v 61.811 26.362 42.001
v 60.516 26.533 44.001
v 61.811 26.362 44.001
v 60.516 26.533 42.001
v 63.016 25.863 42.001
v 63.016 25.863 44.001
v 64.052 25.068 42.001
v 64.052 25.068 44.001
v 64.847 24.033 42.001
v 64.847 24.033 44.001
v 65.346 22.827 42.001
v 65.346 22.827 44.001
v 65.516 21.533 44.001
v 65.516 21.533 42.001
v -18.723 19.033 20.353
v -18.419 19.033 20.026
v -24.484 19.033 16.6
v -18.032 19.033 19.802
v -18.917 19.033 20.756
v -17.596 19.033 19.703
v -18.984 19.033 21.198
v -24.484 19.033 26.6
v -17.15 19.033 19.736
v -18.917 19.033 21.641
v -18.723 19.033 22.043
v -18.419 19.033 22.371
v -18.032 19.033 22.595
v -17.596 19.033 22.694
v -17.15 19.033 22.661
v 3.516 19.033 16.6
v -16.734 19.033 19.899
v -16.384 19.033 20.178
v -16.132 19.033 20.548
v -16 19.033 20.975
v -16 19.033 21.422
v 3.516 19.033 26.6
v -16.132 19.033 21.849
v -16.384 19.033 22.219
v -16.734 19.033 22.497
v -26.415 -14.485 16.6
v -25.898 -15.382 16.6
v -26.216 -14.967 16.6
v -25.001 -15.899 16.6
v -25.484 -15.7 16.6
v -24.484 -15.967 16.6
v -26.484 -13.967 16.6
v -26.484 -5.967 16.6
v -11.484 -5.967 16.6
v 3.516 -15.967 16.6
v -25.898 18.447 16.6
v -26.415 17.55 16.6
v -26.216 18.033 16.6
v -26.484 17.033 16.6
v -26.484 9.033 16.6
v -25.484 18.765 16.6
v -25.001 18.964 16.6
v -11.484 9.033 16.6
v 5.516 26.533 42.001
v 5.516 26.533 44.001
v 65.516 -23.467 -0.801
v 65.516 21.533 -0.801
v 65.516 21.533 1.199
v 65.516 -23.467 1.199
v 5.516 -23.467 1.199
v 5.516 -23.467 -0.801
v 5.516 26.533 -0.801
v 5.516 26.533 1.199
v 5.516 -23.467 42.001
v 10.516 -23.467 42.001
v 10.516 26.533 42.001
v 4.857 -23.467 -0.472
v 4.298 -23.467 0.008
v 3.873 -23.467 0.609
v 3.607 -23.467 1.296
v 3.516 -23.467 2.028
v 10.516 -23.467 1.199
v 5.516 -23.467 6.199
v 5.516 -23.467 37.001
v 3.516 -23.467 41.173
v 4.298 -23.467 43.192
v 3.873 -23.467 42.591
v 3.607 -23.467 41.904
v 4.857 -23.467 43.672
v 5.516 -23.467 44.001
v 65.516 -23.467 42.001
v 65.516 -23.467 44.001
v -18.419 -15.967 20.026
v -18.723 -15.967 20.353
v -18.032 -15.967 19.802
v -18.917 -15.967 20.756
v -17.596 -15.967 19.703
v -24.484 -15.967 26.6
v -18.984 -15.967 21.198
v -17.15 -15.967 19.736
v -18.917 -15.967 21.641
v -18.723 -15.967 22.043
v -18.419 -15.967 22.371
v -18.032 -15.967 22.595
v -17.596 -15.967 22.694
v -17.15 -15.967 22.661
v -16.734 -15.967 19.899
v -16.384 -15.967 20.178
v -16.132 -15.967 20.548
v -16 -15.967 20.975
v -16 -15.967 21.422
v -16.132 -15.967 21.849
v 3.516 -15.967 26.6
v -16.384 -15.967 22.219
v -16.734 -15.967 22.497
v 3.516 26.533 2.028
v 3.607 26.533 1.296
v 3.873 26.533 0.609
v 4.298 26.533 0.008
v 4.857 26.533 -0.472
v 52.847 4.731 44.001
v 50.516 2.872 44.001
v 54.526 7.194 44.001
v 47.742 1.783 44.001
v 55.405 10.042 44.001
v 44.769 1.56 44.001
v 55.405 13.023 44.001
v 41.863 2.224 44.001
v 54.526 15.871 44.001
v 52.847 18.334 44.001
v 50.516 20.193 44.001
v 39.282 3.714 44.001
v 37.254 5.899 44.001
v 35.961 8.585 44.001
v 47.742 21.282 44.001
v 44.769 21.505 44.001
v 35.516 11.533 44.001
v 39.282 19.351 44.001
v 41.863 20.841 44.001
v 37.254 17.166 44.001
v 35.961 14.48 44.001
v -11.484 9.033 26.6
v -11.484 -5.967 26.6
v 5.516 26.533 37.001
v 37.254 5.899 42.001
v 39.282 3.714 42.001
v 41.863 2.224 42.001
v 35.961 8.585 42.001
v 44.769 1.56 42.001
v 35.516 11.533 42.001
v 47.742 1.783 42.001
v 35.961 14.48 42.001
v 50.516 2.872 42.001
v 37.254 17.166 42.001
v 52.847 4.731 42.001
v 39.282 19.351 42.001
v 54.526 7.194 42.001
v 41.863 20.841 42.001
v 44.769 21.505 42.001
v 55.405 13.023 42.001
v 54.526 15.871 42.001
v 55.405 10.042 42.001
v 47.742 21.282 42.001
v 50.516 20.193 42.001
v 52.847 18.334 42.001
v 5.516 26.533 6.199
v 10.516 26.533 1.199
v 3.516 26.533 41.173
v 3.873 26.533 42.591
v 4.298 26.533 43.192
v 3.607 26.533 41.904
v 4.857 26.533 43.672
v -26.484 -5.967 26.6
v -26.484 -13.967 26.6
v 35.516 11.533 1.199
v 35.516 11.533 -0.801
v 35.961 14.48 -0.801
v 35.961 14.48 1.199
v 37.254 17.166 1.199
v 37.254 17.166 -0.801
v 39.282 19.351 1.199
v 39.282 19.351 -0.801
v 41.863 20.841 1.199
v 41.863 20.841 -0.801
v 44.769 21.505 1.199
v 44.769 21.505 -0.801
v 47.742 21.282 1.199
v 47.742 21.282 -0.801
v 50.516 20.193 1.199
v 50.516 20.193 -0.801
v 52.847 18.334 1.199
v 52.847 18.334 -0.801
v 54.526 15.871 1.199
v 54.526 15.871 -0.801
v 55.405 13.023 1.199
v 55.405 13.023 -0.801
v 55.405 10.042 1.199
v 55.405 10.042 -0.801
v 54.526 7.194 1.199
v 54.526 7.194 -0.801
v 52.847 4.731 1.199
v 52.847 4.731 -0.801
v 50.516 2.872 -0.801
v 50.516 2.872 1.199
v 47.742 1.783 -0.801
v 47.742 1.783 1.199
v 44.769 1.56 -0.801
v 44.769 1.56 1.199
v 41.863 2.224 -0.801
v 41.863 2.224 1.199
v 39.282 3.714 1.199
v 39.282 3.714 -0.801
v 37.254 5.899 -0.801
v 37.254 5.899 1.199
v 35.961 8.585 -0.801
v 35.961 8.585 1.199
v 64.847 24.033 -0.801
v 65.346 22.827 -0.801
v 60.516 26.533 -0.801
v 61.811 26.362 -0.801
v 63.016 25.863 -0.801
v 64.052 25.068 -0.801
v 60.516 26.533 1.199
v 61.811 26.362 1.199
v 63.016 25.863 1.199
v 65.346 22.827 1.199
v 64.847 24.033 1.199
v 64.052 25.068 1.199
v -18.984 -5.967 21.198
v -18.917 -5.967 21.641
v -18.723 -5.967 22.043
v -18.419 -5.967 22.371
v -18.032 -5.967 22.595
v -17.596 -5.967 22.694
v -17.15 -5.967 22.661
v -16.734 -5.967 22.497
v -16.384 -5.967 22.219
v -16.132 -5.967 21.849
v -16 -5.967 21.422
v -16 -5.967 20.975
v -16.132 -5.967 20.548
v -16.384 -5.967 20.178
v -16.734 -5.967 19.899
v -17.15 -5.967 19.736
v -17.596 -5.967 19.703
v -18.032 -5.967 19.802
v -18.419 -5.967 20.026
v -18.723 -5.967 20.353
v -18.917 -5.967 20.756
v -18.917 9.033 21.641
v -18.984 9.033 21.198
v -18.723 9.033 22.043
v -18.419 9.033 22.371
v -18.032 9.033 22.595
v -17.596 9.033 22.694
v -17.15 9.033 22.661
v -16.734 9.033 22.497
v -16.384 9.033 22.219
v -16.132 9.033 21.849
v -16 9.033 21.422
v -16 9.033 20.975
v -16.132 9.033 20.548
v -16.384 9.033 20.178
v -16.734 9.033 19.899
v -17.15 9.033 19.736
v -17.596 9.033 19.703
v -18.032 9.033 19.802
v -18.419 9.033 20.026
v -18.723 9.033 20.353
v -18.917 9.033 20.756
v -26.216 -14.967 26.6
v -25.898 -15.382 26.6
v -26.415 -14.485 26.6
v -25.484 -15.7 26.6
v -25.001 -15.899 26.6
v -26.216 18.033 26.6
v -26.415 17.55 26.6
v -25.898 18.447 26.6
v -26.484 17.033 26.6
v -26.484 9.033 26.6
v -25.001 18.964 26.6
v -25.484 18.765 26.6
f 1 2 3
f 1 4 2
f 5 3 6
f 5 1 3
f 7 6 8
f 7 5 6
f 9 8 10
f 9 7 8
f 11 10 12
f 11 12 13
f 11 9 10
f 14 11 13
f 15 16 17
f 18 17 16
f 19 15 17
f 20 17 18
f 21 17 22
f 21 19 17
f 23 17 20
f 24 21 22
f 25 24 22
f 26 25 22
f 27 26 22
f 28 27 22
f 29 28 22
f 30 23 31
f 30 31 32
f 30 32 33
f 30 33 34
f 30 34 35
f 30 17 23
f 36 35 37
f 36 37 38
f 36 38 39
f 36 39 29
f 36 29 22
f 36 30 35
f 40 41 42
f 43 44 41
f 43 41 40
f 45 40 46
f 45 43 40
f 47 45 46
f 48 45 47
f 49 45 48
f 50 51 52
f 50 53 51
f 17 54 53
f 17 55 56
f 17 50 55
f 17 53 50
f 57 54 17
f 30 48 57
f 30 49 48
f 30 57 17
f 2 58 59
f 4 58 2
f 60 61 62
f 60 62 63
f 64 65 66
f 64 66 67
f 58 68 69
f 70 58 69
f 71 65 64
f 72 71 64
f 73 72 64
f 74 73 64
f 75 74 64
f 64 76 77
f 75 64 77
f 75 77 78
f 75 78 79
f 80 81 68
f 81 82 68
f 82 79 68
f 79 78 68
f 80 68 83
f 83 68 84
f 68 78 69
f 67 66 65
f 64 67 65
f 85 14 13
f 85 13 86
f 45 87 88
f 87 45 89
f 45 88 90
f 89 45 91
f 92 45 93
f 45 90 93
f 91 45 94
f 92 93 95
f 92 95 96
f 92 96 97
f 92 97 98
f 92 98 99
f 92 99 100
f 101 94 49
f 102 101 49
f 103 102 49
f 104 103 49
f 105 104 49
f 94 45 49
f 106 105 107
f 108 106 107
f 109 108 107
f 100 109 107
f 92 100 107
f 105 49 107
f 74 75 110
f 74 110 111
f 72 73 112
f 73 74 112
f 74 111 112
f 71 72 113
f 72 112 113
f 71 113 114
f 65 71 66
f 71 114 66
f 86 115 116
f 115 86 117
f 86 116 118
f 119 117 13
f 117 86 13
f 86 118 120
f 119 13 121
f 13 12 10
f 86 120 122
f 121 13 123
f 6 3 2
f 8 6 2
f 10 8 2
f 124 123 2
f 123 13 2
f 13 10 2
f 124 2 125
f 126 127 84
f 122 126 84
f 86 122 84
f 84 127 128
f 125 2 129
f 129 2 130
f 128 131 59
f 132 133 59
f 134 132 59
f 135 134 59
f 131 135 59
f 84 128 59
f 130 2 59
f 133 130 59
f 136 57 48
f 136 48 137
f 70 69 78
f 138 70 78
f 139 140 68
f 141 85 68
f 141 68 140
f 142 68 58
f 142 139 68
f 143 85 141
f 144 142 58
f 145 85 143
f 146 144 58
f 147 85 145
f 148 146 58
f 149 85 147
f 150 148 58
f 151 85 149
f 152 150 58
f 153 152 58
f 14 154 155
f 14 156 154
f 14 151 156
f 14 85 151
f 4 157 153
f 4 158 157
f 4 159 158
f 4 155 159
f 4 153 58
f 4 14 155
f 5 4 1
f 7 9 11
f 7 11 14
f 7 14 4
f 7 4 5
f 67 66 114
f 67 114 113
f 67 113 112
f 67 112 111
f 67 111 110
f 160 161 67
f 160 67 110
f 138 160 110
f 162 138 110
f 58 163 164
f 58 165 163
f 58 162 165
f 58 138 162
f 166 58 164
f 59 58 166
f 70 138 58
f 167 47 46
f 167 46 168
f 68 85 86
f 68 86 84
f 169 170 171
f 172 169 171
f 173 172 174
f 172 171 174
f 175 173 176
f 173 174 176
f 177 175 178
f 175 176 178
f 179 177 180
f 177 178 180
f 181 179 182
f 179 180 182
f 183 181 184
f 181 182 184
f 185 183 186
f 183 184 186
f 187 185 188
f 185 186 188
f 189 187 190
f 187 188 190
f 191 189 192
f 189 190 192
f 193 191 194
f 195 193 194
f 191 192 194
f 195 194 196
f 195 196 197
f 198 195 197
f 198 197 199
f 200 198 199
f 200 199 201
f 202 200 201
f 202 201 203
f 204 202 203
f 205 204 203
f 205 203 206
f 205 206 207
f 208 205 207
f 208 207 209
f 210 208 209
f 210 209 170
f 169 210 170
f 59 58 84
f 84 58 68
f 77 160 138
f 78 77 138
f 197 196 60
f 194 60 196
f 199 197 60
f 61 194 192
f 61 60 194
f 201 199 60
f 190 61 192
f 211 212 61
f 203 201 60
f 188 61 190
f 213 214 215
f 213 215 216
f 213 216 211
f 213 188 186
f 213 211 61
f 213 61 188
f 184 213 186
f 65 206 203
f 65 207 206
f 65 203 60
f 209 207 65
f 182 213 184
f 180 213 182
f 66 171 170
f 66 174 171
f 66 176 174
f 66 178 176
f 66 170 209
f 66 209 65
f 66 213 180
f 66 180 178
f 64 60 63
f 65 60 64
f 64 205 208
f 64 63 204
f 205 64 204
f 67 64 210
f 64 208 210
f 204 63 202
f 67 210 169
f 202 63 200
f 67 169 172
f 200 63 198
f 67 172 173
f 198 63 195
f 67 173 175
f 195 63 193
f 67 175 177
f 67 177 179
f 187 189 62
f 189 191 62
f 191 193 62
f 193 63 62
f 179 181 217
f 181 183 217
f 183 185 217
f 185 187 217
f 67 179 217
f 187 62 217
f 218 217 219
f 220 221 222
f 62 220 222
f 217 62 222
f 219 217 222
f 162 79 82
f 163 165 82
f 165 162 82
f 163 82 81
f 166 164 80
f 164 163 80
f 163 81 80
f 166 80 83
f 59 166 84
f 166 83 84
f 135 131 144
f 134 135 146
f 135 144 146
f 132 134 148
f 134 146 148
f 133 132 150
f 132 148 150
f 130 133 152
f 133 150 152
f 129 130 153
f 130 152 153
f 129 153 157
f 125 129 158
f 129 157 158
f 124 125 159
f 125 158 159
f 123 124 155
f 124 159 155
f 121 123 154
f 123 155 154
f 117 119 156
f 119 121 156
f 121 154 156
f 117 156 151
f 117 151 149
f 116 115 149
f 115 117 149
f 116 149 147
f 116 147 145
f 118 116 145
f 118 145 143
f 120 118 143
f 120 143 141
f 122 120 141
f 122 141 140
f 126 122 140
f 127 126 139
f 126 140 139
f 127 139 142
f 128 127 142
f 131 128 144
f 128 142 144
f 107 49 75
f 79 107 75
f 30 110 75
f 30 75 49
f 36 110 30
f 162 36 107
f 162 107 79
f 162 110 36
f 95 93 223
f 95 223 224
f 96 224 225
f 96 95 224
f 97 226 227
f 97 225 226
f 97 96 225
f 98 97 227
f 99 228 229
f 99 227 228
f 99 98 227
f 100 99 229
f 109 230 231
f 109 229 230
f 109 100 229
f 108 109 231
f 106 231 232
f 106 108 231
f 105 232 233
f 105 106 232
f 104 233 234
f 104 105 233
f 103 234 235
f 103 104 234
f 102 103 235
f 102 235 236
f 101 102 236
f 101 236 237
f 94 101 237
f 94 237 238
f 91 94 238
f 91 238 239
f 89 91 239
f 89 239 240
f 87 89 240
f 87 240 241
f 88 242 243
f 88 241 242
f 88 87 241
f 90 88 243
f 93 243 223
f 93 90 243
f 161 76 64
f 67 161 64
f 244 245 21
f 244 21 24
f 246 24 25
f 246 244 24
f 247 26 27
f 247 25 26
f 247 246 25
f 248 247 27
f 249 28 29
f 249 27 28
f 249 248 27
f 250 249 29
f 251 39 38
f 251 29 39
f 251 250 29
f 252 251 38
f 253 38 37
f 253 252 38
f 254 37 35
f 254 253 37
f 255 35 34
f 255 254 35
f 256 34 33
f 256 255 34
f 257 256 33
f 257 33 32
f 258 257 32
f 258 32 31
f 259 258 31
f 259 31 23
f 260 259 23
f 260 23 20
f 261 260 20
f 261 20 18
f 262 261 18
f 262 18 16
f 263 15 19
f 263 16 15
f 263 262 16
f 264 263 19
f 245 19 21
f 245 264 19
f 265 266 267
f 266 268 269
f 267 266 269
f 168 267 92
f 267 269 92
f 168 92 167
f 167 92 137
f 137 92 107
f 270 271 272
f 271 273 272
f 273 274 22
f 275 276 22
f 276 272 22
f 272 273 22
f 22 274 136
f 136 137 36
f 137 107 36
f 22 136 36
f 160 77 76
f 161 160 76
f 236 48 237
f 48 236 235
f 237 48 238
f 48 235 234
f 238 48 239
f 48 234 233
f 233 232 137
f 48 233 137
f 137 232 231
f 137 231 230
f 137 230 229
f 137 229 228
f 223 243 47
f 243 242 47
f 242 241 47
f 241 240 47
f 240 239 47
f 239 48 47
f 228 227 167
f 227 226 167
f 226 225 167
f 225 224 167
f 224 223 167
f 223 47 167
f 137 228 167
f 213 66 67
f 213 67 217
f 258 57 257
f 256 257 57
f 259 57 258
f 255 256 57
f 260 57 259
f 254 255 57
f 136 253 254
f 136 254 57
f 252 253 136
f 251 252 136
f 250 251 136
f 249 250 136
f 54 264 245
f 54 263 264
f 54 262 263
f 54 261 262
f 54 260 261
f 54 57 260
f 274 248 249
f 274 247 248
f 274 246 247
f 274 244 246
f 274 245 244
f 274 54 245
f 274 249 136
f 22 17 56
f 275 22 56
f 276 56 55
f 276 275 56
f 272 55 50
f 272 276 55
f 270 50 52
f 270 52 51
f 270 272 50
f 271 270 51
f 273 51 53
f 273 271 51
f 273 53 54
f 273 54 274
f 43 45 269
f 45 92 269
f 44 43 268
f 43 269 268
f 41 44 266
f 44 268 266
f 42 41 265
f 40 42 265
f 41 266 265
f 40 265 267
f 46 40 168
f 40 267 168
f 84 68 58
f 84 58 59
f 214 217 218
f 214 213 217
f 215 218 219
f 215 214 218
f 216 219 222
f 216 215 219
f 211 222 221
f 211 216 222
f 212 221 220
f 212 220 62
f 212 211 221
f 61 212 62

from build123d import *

# Parameters (mm, degrees)
SKETCH_3_R               = 3
EXTRUDE_6_DEPTH          = 0.001
EXTRUDE_6_2_DEPTH        = 0.001
EXTRUDE_6_3_DEPTH        = 0.001
EXTRUDE_6_4_DEPTH        = 0.001
CUT_EXTRUDE_2_DEPTH      = 67.213034483
CUT_EXTRUDE_2_DEPTH_BACK = 67.213034483
SKETCH_11_R              = 2.25
EXTRUDE_7_DEPTH          = 2
EXTRUDE_7_DEPTH_BACK     = 0.801922547
SKETCH_14_R              = 10
CUT_EXTRUDE_3_DEPTH      = 3
SKETCH_12_4_R            = 10
EXTRUDE_10_DEPTH         = 44
SKETCH_20_W              = 40.801922547
SKETCH_20_H              = 50
CUT_EXTRUDE_6_DEPTH      = 60
SKETCH_21_W              = 44.801922547
SKETCH_21_H              = 50
EXTRUDE_11_DEPTH         = 2
FILLET_2_R               = 5
FILLET_3_R               = 5
FILLET_5_R               = 3
FILLET_6_R               = 3
EXTRUDE_15_DEPTH         = 50
SKETCH_36_W              = 10
SKETCH_36_H              = 35
EXTRUDE_16_DEPTH         = 30
FILLET_7_R               = 2
CUT_EXTRUDE_8_DEPTH      = 90.636750061
CUT_EXTRUDE_8_DEPTH_BACK = 90.636750061
SKETCH_39_R              = 1.5
SKETCH_38_W              = 10
SKETCH_38_H              = 15
CUT_EXTRUDE_9_DEPTH      = 15


with BuildPart() as part:
    # 草图3 → 凸台-拉伸6 (new body)
    with BuildSketch(Plane.XY):
        with Locations((60.266478541, 16.532501821)):
            Circle(SKETCH_3_R)
    extrude(amount=EXTRUDE_6_DEPTH)


with BuildPart() as body_2:
    # 草图3 → Extrude 6 2 (new body)
    with BuildSketch(Plane.XY):
        with Locations((60.266478541, 6.532501821)):
            Circle(SKETCH_3_R)
    extrude(amount=EXTRUDE_6_2_DEPTH)


with BuildPart() as body_3:
    # 草图3 → Extrude 6 3 (new body)
    with BuildSketch(Plane.XY):
        with Locations((10.766478541, 6.532501821)):
            Circle(SKETCH_3_R)
    extrude(amount=EXTRUDE_6_3_DEPTH)


with BuildPart() as body_4:
    # 草图3 → Extrude 6 4 (new body)
    with BuildSketch(Plane.XY):
        with Locations((10.766478541, 16.532501821)):
            Circle(SKETCH_3_R)
    extrude(amount=EXTRUDE_6_4_DEPTH)


with BuildPart() as cut_extrude_2_tool:
    # 草图11 → 切除-拉伸2 (new, two sides: drawn at the far end of the back side and taken through both)
    with BuildSketch(Plane.XY.offset(0.001).offset(-CUT_EXTRUDE_2_DEPTH_BACK)):
        with Locations((10.766478541, 16.532501821)):
            Circle(SKETCH_11_R)
        with Locations((10.766478541, 6.532501821)):
            Circle(SKETCH_11_R)
        with Locations((60.266478541, 16.532501821)):
            Circle(SKETCH_11_R)
        with Locations((60.266478541, 6.532501821)):
            Circle(SKETCH_11_R)
    extrude(amount=CUT_EXTRUDE_2_DEPTH + CUT_EXTRUDE_2_DEPTH_BACK)


with BuildPart() as part_1:
    add(part.part)

    # 切除-拉伸2: cut by cut_extrude_2_tool
    add(cut_extrude_2_tool.part, mode=Mode.SUBTRACT)



with BuildPart() as body_2_1:
    add(body_2.part)

    # 切除-拉伸2: cut by cut_extrude_2_tool
    add(cut_extrude_2_tool.part, mode=Mode.SUBTRACT)


with BuildPart() as body_3_1:
    add(body_3.part)

    # 切除-拉伸2: cut by cut_extrude_2_tool
    add(cut_extrude_2_tool.part, mode=Mode.SUBTRACT)


with BuildPart() as body_4_1:
    add(body_4.part)

    # 切除-拉伸2: cut by cut_extrude_2_tool
    add(cut_extrude_2_tool.part, mode=Mode.SUBTRACT)


with BuildPart() as body_5:
    # 草图12 → 凸台-拉伸7 (new, two sides: drawn at the far end of the back side and taken through both)
    with BuildSketch(Plane.XY.offset(0.001).offset(-EXTRUDE_7_DEPTH_BACK)):
        Polygon((5.516478541, 26.532501821), (65.516478541, 26.532501821), (65.516478541, -23.467498179), (5.516478541, -23.467498179), (5.516478541, 1.532501821), align=None)
    extrude(amount=EXTRUDE_7_DEPTH + EXTRUDE_7_DEPTH_BACK)

    # 草图14 → 切除-拉伸3 (cut)
    with BuildSketch(Plane(origin=(0, 0, -0.800922547), x_dir=(-1, 0, 0), z_dir=(0, 0, -1))):
        with Locations((-45.516478541, 11.532501821)):
            Circle(SKETCH_14_R)
    extrude(amount=-CUT_EXTRUDE_3_DEPTH, mode=Mode.SUBTRACT)


with BuildPart() as part_2:
    add(part_1.part)

    add(body_2_1.part)  # 凸台-拉伸10 merges body 2

    add(body_3_1.part)  # 凸台-拉伸10 merges body 3

    add(body_4_1.part)  # 凸台-拉伸10 merges body 4

    add(body_5.part)  # 凸台-拉伸10 merges body 5
    # 草图12<4> → 凸台-拉伸10 (add)
    with BuildSketch(Plane.XY.offset(0.001)):
        Polygon((5.516478541, 26.532501821), (65.516478541, 26.532501821), (65.516478541, -23.467498179), (5.516478541, -23.467498179), (5.516478541, 1.532501821), align=None)
        with Locations(Location((45.516478541, 11.532501821, 0), (0, 0, 180))):
            Circle(SKETCH_12_4_R, mode=Mode.SUBTRACT)
    extrude(amount=EXTRUDE_10_DEPTH)

    # 草图20 → 切除-拉伸6 (cut)
    with BuildSketch(Plane(origin=(65.516478541, 0, 0), x_dir=(0, 0, -1), z_dir=(1, 0, 0))):
        with Locations((-21.600038727, 1.532501821)):
            Rectangle(SKETCH_20_W, SKETCH_20_H)
    extrude(amount=-CUT_EXTRUDE_6_DEPTH, mode=Mode.SUBTRACT)


with BuildPart() as cut_extrude_6_piece_1:
    # of the separate pieces the step leaves, piece 1, a body of its own (cut_extrude_6_pieces)
    add(part_2.part.solids().sort_by_distance((5.516478541, 26.532501821, 42.001))[0])

    # 圆角3
    fillet_3_edges = [cut_extrude_6_piece_1.edges().sort_by_distance(p)[0] for p in [
        (65.516478541, 26.532501821, 43.001),
    ]]
    fillet(fillet_3_edges, radius=FILLET_3_R)


with BuildPart() as cut_extrude_6_piece_2:
    # of the separate pieces the step leaves, piece 2, a body of its own (cut_extrude_6_pieces)
    add(part_2.part.solids().sort_by_distance((5.516478541, 26.532501821, -0.800922547))[0])

    # 圆角2
    fillet_2_edges = [cut_extrude_6_piece_2.edges().sort_by_distance(p)[0] for p in [
        (65.516478541, 26.532501821, 0.199077453),
    ]]
    fillet(fillet_2_edges, radius=FILLET_2_R)


with BuildPart() as body_3_2:
    # 草图21 → 凸台-拉伸11 (new body)
    with BuildSketch(Plane.ZY.offset(-5.516478541)):
        with Locations((21.600038727, 1.532501821)):
            Rectangle(SKETCH_21_W, SKETCH_21_H)
    extrude(amount=EXTRUDE_11_DEPTH)

    # 圆角5
    # the kernel refuses this fillet: 3 mm, written as the material it takes off along each edge
    with BuildSketch(Plane(origin=(3.516478541, -30.538565991, 44.001), x_dir=(1, 0, 0), z_dir=(0, 1, 0))) as fillet_5_piece_1:
        with BuildLine():
            CenterArc((3, 2.828427125), FILLET_5_R, 180, 70.528779366)
            Line((0, 2.828427125), (-0.06, 2.828427125))
            Line((-0.06, 2.828427125), (-0.06, 0))
            Line((-0.06, 0), (0, -0.06))
            ThreePointArc((0, -0.06), (1, -0.06), (1.98, -0.056568542))
            Line((1.98, -0.056568542), (2, 0))
        make_face()
    extrude(amount=64.142135624, mode=Mode.SUBTRACT)

    # 圆角6
    # the kernel refuses this fillet: 3 mm, written as the material it takes off along each edge
    with BuildSketch(Plane(origin=(3.516478541, 33.603569633, -0.800922547), x_dir=(0, 0, 1), z_dir=(0, -1, 0))) as fillet_6_piece_1:
        with BuildLine():
            CenterArc((2.828427125, -3), FILLET_6_R, 90, 70.528779366)
            Line((0, -2), (-0.056568542, -1.98))
            ThreePointArc((-0.056568542, -1.98), (-0.06, -1), (-0.06, 0))
            Line((-0.06, 0), (0, 0.06))
            Line((0, 0.06), (2.828427125, 0.06))
            Line((2.828427125, 0.06), (2.828427125, 0))
        make_face()
    extrude(amount=64.142135624, mode=Mode.SUBTRACT)

    # 草图35 → 凸台-拉伸15 (add)
    with BuildSketch(Plane.XZ.offset(23.467498179)):
        Polygon((5.516478541, 42.001), (10.516478541, 42.001), (5.516478541, 37.001), align=None)
        Polygon((5.516478541, 1.199077453), (5.516478541, 6.199077453), (10.516478541, 1.199077453), align=None)
    extrude(amount=-EXTRUDE_15_DEPTH)

    # 草图36 → 凸台-拉伸16 (add)
    with BuildSketch(Plane.ZY.offset(-3.516478541)):
        with Locations((21.600038726, 1.532501821)):
            Rectangle(SKETCH_36_W, SKETCH_36_H)
    extrude(amount=EXTRUDE_16_DEPTH)

    # 圆角7
    fillet_7_edges = [body_3_2.edges().sort_by_distance(p)[0] for p in [
        (-26.483521459, 19.032501821, 21.600038726),
        (-26.483521459, -15.967498179, 21.600038726),
    ]]
    fillet(fillet_7_edges, radius=FILLET_7_R)

    # 草图39 → 切除-拉伸8 (cut, two sides: drawn at the far end of the back side and taken through both)
    with BuildSketch(Plane(origin=(0, 19.032501821, 0), x_dir=(1, 0, 0), z_dir=(0, 1, 0)).offset(-CUT_EXTRUDE_8_DEPTH_BACK)):
        with Locations(Location((-17.483521459, -21.198379325, 0), (0, 0, 180))):
            Circle(SKETCH_39_R)
    extrude(amount=CUT_EXTRUDE_8_DEPTH + CUT_EXTRUDE_8_DEPTH_BACK, mode=Mode.SUBTRACT)

    # 草图38 → 切除-拉伸9 (cut)
    with BuildSketch(Plane.ZY.offset(26.483521459)):
        with Locations((21.600038726, 1.532501821)):
            Rectangle(SKETCH_38_W, SKETCH_38_H)
    extrude(amount=-CUT_EXTRUDE_9_DEPTH, mode=Mode.SUBTRACT)


solid = Compound([cut_extrude_6_piece_1.part, cut_extrude_6_piece_2.part, body_3_2.part])
